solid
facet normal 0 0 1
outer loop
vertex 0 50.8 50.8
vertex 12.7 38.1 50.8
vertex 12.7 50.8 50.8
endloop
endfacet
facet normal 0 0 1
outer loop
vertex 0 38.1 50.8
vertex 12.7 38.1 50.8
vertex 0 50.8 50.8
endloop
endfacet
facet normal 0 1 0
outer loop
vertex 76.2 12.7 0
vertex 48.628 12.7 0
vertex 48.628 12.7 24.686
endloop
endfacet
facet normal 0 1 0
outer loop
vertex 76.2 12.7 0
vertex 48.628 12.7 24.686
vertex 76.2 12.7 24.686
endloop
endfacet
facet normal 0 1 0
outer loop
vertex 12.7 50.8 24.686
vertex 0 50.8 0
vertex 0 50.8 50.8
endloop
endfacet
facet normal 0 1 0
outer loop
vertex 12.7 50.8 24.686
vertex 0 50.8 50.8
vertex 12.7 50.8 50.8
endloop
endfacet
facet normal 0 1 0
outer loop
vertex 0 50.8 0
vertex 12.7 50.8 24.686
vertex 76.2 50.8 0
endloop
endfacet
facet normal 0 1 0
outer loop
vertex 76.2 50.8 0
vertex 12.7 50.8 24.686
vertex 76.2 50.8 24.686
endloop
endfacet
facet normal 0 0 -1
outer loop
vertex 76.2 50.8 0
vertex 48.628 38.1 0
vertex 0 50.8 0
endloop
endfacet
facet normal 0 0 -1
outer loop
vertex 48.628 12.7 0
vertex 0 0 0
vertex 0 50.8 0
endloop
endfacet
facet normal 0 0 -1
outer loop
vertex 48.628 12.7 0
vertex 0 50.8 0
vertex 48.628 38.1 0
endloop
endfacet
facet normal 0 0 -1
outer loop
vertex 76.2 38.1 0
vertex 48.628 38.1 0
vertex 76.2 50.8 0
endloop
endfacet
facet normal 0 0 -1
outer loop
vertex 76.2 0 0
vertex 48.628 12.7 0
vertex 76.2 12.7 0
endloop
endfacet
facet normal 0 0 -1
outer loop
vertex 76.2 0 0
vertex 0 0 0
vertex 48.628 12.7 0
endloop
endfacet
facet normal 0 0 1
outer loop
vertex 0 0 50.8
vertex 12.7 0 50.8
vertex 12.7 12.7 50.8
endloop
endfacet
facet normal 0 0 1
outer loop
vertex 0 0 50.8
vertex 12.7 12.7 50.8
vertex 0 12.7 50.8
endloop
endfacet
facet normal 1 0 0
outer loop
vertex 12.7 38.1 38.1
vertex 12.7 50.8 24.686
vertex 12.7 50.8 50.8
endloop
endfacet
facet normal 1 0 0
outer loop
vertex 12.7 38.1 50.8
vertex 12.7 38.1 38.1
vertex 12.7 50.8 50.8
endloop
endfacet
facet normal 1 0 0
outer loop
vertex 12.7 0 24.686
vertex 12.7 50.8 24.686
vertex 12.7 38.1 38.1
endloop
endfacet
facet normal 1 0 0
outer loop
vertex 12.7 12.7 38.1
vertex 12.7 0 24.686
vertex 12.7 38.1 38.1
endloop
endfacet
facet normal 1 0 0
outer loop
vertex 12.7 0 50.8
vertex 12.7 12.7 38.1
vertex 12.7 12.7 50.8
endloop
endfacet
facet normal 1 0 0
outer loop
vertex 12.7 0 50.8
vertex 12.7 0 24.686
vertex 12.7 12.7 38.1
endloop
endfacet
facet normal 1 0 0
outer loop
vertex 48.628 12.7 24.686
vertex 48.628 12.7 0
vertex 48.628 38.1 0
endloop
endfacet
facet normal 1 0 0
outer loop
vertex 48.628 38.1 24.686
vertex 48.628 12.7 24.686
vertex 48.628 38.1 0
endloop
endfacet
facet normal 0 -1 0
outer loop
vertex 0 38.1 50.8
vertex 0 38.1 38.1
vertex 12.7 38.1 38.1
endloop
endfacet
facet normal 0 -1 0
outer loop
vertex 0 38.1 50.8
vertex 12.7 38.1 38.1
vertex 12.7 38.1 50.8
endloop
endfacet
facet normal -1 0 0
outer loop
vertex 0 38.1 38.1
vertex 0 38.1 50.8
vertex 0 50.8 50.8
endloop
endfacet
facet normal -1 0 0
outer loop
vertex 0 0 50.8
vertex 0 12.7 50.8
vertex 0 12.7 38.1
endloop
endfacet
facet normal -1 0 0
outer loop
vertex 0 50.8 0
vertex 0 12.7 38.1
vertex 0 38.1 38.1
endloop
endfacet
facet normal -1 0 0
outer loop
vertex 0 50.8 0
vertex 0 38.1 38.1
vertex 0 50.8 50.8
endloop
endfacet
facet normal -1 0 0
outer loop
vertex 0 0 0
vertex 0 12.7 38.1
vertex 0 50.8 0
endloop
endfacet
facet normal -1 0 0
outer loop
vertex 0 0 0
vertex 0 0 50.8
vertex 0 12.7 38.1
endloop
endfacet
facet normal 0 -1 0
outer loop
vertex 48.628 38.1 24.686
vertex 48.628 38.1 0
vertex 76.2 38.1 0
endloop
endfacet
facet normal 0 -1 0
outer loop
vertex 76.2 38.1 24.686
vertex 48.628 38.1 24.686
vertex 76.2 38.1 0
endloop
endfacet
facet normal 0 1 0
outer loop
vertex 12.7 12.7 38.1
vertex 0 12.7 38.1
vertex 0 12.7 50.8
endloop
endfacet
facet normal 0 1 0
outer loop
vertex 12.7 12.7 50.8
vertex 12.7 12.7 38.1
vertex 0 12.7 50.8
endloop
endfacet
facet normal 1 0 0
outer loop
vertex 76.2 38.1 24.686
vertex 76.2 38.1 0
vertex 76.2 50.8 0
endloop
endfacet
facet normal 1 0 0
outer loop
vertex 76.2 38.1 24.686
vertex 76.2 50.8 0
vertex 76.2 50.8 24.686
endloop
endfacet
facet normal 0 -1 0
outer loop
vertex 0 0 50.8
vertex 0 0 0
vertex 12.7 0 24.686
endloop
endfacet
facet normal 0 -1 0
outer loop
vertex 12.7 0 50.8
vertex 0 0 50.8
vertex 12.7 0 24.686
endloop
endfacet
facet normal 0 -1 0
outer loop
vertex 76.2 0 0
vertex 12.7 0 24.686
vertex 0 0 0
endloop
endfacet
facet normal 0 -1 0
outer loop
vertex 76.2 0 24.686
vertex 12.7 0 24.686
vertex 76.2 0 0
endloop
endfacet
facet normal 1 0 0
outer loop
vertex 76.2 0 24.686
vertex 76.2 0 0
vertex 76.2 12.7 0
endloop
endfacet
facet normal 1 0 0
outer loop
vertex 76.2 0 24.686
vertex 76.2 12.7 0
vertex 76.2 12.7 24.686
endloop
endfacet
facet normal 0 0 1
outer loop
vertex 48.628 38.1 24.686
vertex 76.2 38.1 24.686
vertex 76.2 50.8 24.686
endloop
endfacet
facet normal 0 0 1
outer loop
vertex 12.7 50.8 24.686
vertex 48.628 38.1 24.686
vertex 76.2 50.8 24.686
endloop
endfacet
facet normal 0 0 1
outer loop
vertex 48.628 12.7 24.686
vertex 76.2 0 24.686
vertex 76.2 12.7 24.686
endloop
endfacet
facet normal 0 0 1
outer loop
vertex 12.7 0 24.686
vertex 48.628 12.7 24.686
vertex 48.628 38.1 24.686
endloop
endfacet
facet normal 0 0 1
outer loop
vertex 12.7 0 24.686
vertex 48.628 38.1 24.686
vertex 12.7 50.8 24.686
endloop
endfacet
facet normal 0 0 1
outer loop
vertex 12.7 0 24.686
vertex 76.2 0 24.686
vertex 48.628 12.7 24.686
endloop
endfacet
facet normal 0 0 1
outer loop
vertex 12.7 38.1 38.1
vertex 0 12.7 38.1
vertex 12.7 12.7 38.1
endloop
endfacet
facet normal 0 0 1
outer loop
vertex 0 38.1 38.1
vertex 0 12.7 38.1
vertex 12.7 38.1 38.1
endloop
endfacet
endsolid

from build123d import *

# Parameters (mm, degrees)
F3_DEPTH = 50.8
F1_W     = 27.572012
F1_H     = 25.4
F4_DEPTH = 25.4
F2_W     = 25.4
F2_H     = 12.7
F5_DEPTH = 12.7


with BuildPart() as f3:
    # F0 (on Front) → F3 (new body)
    with BuildSketch(Plane.XZ):
        Polygon((0, 50.8), (0, 0), (76.2, 0), (76.2, 24.685946), (12.7, 24.685946), (12.7, 50.8), align=None)
    extrude(amount=-F3_DEPTH)

    # F1 (on Top) → F4 (cut)
    with BuildSketch(Plane.XY):
        with Locations((62.413994, 25.4)):
            Rectangle(F1_W, F1_H)
    extrude(amount=F4_DEPTH, mode=Mode.SUBTRACT)

    # F2 (on Right) → F5 (cut)
    with BuildSketch(Plane.YZ):
        with Locations((25.4, 44.45)):
            Rectangle(F2_W, F2_H)
    extrude(amount=F5_DEPTH, mode=Mode.SUBTRACT)


solid = f3.part
